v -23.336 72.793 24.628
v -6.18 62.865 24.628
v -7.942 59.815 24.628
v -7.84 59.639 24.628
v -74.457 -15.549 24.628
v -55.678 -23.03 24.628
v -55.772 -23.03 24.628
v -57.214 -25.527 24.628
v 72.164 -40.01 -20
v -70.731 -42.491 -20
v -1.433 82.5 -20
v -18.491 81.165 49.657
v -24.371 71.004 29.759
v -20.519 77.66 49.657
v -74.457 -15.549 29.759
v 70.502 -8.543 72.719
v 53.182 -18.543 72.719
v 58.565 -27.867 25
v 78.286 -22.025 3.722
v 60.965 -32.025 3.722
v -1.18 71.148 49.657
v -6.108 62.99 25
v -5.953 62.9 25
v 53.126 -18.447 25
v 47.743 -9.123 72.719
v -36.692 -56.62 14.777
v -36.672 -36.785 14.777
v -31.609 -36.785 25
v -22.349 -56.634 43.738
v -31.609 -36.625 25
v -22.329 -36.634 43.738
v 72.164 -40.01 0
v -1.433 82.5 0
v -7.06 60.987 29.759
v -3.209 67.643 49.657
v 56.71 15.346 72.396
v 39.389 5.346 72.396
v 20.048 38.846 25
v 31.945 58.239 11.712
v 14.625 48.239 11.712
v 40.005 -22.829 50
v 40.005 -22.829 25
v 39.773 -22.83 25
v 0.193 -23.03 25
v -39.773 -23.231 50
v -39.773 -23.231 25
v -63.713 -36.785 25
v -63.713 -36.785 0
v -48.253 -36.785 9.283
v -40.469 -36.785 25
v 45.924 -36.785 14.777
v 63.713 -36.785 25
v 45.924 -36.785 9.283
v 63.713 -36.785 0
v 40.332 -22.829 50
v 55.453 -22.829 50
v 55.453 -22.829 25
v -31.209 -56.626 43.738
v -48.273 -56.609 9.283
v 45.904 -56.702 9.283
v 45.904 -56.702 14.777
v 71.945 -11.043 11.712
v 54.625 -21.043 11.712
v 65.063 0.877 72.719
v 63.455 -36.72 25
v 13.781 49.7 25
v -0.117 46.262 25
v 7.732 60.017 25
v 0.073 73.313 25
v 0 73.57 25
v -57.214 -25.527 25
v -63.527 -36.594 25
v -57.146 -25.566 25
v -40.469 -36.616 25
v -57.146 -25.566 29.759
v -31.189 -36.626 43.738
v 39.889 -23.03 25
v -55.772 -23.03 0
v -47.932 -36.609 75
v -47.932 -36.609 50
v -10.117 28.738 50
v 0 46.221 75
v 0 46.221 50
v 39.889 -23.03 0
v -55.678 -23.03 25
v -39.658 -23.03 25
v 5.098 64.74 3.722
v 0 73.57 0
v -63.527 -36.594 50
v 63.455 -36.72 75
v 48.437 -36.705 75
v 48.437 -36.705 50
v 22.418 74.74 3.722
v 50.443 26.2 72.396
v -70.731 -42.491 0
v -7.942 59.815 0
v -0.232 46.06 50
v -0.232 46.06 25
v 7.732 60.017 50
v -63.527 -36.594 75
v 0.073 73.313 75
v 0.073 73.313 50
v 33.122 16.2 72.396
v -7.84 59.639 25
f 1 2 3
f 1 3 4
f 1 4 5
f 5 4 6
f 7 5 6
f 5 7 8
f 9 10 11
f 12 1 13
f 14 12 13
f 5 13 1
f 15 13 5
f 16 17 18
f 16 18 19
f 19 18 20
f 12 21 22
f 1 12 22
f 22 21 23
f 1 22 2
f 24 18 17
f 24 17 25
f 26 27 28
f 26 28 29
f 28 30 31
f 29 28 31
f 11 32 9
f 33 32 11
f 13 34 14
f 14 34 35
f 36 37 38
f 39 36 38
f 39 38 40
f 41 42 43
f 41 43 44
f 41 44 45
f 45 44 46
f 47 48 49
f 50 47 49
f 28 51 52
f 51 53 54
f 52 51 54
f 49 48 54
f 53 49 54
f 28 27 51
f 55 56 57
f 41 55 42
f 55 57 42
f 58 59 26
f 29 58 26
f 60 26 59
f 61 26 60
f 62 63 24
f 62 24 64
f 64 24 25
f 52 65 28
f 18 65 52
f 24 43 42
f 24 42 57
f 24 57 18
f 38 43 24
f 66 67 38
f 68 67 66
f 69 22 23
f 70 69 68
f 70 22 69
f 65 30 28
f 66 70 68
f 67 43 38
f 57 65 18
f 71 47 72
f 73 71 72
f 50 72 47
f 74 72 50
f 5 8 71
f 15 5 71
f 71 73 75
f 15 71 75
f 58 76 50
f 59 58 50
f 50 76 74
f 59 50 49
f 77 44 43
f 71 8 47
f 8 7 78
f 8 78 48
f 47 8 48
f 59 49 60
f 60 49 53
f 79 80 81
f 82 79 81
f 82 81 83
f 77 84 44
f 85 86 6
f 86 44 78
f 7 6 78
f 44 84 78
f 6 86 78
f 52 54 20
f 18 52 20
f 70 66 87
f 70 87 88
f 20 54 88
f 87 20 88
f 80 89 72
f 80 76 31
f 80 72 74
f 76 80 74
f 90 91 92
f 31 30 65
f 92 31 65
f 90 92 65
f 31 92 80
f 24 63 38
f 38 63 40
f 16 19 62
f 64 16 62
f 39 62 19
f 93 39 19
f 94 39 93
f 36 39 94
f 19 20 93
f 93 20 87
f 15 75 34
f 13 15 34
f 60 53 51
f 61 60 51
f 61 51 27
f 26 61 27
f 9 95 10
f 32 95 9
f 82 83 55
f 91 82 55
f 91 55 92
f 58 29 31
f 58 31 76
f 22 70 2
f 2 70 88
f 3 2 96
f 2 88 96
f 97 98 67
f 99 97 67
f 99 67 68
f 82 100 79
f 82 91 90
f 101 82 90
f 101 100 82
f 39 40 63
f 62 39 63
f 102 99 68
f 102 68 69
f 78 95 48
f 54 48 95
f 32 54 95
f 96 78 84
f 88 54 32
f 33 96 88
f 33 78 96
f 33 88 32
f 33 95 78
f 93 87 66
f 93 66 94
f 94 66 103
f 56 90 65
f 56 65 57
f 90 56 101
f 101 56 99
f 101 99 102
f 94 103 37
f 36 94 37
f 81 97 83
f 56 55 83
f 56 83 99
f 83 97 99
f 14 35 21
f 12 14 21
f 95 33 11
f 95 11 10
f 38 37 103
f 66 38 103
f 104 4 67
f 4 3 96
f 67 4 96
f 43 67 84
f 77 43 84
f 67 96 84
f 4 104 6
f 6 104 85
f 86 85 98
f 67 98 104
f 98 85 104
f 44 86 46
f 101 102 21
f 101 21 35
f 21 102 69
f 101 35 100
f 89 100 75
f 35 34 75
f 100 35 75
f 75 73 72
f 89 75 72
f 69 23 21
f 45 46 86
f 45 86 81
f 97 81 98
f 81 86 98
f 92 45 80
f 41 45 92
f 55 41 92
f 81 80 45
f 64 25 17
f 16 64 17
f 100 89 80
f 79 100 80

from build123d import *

# Parameters (mm, degrees)
F2_DEPTH  = 20
F3_DEPTH  = 25
F6_DEPTH  = 25
F9_DEPTH  = 25
F12_DEPTH = 20
F15_DEPTH = 20
F18_DEPTH = 20


with BuildPart() as f2:
    # F0 (on Top) → F2 (new body)
    with BuildSketch(Plane.XY):
        Polygon((72.1636915906, -40.0095078308), (-1.4325956209, 82.5003440637), (-70.7310959697, -42.4908362329), align=None)
    extrude(amount=-F2_DEPTH)

    # F1 (on face) → F3 (join)
    with BuildSketch(Plane.XY):
        Polygon((63.7132421591, -36.7848575115), (0, 73.569715023), (-7.9415651396, 59.8145207096), (39.8885467402, -23.0296631981), (-55.7716770195, -23.0296631981), (-63.7132421591, -36.7848575115), align=None)
    extrude(amount=F3_DEPTH)

    # F5 (on offset) → F6 (join)
    with BuildSketch(Plane.XY.offset(25)):
        Polygon((-63.5274310143, -36.5936169448), (63.4547173977, -36.7195606232), (55.453214499, -22.828752175), (40.0054380298, -22.828752175), (-39.7729983351, -23.2313495358), (-0.2324396947, 46.0601017108), (7.7318175716, 60.0167822194), (0.0727136166, 73.3131775679), align=None)
    extrude(amount=F6_DEPTH)

    # F8 (on offset) → F9 (join)
    with BuildSketch(Plane.XY.offset(50)):
        Polygon((0.0727136166, 73.3131775679), (-63.5274310143, -36.5936169448), (-47.9317654972, -36.6090850677), (0, 46.2213350785), (48.4369544614, -36.7046656767), (63.4547173977, -36.7195606232), align=None)
    extrude(amount=F9_DEPTH)

    # F11 (on offset) → F12 (join)
    with BuildSketch(Plane(origin=(-0.0363568083, -36.656588784, 0), x_dir=(0.9999995081, -0.0009918214, 0), z_dir=(-0.0009918214, -0.9999995081, 0))):
        Polygon((-31.1529804021, 43.7380857766), (-48.2164211571, 9.2830741778), (45.9606572986, 9.2830741778), (45.9606572986, 14.7767344154), (-36.6358867937, 14.7767344154), (-22.2931168973, 43.7380857766), align=None)
    extrude(amount=F12_DEPTH)

    # F14 (on offset) → F15 (join)
    with BuildSketch(Plane(origin=(-31.7273586988, 18.3597803116, 0), x_dir=(-0.5008586966, -0.8655290671, 0), z_dir=(-0.8655290671, 0.5008586966, 0))):
        Polygon((-51.3164810836, 24.628393352), (-49.2495509186, 24.628393352), (-43.5906848585, 24.628393352), (50.7504490814, 24.628393352), (50.7504490814, 29.7592282616), (-49.2495509186, 29.7592282616), (-56.9396201191, 49.6568456292), (-60.9895251691, 49.6568456292), align=None)
    extrude(amount=F15_DEPTH)

    # F17 (on offset) → F18 (join)
    with BuildSketch(Plane(origin=(31.8566210796, 18.3924287558, 0), x_dir=(-0.5, 0.8660254038, 0), z_dir=(0.8660254038, 0.5, 0))):
        Polygon((-31.7721163192, 72.7189217287), (-42.6499355114, 72.7189217287), (-58.2169406468, 3.7218167854), (53.5177626068, 3.7218167854), (-2.5316273462, 72.3955608765), (-15.0649024936, 72.3955608765), (34.463509317, 11.7115555596), (-45.536490683, 11.7115555596), align=None)
    extrude(amount=F18_DEPTH)


solid = f2.part
